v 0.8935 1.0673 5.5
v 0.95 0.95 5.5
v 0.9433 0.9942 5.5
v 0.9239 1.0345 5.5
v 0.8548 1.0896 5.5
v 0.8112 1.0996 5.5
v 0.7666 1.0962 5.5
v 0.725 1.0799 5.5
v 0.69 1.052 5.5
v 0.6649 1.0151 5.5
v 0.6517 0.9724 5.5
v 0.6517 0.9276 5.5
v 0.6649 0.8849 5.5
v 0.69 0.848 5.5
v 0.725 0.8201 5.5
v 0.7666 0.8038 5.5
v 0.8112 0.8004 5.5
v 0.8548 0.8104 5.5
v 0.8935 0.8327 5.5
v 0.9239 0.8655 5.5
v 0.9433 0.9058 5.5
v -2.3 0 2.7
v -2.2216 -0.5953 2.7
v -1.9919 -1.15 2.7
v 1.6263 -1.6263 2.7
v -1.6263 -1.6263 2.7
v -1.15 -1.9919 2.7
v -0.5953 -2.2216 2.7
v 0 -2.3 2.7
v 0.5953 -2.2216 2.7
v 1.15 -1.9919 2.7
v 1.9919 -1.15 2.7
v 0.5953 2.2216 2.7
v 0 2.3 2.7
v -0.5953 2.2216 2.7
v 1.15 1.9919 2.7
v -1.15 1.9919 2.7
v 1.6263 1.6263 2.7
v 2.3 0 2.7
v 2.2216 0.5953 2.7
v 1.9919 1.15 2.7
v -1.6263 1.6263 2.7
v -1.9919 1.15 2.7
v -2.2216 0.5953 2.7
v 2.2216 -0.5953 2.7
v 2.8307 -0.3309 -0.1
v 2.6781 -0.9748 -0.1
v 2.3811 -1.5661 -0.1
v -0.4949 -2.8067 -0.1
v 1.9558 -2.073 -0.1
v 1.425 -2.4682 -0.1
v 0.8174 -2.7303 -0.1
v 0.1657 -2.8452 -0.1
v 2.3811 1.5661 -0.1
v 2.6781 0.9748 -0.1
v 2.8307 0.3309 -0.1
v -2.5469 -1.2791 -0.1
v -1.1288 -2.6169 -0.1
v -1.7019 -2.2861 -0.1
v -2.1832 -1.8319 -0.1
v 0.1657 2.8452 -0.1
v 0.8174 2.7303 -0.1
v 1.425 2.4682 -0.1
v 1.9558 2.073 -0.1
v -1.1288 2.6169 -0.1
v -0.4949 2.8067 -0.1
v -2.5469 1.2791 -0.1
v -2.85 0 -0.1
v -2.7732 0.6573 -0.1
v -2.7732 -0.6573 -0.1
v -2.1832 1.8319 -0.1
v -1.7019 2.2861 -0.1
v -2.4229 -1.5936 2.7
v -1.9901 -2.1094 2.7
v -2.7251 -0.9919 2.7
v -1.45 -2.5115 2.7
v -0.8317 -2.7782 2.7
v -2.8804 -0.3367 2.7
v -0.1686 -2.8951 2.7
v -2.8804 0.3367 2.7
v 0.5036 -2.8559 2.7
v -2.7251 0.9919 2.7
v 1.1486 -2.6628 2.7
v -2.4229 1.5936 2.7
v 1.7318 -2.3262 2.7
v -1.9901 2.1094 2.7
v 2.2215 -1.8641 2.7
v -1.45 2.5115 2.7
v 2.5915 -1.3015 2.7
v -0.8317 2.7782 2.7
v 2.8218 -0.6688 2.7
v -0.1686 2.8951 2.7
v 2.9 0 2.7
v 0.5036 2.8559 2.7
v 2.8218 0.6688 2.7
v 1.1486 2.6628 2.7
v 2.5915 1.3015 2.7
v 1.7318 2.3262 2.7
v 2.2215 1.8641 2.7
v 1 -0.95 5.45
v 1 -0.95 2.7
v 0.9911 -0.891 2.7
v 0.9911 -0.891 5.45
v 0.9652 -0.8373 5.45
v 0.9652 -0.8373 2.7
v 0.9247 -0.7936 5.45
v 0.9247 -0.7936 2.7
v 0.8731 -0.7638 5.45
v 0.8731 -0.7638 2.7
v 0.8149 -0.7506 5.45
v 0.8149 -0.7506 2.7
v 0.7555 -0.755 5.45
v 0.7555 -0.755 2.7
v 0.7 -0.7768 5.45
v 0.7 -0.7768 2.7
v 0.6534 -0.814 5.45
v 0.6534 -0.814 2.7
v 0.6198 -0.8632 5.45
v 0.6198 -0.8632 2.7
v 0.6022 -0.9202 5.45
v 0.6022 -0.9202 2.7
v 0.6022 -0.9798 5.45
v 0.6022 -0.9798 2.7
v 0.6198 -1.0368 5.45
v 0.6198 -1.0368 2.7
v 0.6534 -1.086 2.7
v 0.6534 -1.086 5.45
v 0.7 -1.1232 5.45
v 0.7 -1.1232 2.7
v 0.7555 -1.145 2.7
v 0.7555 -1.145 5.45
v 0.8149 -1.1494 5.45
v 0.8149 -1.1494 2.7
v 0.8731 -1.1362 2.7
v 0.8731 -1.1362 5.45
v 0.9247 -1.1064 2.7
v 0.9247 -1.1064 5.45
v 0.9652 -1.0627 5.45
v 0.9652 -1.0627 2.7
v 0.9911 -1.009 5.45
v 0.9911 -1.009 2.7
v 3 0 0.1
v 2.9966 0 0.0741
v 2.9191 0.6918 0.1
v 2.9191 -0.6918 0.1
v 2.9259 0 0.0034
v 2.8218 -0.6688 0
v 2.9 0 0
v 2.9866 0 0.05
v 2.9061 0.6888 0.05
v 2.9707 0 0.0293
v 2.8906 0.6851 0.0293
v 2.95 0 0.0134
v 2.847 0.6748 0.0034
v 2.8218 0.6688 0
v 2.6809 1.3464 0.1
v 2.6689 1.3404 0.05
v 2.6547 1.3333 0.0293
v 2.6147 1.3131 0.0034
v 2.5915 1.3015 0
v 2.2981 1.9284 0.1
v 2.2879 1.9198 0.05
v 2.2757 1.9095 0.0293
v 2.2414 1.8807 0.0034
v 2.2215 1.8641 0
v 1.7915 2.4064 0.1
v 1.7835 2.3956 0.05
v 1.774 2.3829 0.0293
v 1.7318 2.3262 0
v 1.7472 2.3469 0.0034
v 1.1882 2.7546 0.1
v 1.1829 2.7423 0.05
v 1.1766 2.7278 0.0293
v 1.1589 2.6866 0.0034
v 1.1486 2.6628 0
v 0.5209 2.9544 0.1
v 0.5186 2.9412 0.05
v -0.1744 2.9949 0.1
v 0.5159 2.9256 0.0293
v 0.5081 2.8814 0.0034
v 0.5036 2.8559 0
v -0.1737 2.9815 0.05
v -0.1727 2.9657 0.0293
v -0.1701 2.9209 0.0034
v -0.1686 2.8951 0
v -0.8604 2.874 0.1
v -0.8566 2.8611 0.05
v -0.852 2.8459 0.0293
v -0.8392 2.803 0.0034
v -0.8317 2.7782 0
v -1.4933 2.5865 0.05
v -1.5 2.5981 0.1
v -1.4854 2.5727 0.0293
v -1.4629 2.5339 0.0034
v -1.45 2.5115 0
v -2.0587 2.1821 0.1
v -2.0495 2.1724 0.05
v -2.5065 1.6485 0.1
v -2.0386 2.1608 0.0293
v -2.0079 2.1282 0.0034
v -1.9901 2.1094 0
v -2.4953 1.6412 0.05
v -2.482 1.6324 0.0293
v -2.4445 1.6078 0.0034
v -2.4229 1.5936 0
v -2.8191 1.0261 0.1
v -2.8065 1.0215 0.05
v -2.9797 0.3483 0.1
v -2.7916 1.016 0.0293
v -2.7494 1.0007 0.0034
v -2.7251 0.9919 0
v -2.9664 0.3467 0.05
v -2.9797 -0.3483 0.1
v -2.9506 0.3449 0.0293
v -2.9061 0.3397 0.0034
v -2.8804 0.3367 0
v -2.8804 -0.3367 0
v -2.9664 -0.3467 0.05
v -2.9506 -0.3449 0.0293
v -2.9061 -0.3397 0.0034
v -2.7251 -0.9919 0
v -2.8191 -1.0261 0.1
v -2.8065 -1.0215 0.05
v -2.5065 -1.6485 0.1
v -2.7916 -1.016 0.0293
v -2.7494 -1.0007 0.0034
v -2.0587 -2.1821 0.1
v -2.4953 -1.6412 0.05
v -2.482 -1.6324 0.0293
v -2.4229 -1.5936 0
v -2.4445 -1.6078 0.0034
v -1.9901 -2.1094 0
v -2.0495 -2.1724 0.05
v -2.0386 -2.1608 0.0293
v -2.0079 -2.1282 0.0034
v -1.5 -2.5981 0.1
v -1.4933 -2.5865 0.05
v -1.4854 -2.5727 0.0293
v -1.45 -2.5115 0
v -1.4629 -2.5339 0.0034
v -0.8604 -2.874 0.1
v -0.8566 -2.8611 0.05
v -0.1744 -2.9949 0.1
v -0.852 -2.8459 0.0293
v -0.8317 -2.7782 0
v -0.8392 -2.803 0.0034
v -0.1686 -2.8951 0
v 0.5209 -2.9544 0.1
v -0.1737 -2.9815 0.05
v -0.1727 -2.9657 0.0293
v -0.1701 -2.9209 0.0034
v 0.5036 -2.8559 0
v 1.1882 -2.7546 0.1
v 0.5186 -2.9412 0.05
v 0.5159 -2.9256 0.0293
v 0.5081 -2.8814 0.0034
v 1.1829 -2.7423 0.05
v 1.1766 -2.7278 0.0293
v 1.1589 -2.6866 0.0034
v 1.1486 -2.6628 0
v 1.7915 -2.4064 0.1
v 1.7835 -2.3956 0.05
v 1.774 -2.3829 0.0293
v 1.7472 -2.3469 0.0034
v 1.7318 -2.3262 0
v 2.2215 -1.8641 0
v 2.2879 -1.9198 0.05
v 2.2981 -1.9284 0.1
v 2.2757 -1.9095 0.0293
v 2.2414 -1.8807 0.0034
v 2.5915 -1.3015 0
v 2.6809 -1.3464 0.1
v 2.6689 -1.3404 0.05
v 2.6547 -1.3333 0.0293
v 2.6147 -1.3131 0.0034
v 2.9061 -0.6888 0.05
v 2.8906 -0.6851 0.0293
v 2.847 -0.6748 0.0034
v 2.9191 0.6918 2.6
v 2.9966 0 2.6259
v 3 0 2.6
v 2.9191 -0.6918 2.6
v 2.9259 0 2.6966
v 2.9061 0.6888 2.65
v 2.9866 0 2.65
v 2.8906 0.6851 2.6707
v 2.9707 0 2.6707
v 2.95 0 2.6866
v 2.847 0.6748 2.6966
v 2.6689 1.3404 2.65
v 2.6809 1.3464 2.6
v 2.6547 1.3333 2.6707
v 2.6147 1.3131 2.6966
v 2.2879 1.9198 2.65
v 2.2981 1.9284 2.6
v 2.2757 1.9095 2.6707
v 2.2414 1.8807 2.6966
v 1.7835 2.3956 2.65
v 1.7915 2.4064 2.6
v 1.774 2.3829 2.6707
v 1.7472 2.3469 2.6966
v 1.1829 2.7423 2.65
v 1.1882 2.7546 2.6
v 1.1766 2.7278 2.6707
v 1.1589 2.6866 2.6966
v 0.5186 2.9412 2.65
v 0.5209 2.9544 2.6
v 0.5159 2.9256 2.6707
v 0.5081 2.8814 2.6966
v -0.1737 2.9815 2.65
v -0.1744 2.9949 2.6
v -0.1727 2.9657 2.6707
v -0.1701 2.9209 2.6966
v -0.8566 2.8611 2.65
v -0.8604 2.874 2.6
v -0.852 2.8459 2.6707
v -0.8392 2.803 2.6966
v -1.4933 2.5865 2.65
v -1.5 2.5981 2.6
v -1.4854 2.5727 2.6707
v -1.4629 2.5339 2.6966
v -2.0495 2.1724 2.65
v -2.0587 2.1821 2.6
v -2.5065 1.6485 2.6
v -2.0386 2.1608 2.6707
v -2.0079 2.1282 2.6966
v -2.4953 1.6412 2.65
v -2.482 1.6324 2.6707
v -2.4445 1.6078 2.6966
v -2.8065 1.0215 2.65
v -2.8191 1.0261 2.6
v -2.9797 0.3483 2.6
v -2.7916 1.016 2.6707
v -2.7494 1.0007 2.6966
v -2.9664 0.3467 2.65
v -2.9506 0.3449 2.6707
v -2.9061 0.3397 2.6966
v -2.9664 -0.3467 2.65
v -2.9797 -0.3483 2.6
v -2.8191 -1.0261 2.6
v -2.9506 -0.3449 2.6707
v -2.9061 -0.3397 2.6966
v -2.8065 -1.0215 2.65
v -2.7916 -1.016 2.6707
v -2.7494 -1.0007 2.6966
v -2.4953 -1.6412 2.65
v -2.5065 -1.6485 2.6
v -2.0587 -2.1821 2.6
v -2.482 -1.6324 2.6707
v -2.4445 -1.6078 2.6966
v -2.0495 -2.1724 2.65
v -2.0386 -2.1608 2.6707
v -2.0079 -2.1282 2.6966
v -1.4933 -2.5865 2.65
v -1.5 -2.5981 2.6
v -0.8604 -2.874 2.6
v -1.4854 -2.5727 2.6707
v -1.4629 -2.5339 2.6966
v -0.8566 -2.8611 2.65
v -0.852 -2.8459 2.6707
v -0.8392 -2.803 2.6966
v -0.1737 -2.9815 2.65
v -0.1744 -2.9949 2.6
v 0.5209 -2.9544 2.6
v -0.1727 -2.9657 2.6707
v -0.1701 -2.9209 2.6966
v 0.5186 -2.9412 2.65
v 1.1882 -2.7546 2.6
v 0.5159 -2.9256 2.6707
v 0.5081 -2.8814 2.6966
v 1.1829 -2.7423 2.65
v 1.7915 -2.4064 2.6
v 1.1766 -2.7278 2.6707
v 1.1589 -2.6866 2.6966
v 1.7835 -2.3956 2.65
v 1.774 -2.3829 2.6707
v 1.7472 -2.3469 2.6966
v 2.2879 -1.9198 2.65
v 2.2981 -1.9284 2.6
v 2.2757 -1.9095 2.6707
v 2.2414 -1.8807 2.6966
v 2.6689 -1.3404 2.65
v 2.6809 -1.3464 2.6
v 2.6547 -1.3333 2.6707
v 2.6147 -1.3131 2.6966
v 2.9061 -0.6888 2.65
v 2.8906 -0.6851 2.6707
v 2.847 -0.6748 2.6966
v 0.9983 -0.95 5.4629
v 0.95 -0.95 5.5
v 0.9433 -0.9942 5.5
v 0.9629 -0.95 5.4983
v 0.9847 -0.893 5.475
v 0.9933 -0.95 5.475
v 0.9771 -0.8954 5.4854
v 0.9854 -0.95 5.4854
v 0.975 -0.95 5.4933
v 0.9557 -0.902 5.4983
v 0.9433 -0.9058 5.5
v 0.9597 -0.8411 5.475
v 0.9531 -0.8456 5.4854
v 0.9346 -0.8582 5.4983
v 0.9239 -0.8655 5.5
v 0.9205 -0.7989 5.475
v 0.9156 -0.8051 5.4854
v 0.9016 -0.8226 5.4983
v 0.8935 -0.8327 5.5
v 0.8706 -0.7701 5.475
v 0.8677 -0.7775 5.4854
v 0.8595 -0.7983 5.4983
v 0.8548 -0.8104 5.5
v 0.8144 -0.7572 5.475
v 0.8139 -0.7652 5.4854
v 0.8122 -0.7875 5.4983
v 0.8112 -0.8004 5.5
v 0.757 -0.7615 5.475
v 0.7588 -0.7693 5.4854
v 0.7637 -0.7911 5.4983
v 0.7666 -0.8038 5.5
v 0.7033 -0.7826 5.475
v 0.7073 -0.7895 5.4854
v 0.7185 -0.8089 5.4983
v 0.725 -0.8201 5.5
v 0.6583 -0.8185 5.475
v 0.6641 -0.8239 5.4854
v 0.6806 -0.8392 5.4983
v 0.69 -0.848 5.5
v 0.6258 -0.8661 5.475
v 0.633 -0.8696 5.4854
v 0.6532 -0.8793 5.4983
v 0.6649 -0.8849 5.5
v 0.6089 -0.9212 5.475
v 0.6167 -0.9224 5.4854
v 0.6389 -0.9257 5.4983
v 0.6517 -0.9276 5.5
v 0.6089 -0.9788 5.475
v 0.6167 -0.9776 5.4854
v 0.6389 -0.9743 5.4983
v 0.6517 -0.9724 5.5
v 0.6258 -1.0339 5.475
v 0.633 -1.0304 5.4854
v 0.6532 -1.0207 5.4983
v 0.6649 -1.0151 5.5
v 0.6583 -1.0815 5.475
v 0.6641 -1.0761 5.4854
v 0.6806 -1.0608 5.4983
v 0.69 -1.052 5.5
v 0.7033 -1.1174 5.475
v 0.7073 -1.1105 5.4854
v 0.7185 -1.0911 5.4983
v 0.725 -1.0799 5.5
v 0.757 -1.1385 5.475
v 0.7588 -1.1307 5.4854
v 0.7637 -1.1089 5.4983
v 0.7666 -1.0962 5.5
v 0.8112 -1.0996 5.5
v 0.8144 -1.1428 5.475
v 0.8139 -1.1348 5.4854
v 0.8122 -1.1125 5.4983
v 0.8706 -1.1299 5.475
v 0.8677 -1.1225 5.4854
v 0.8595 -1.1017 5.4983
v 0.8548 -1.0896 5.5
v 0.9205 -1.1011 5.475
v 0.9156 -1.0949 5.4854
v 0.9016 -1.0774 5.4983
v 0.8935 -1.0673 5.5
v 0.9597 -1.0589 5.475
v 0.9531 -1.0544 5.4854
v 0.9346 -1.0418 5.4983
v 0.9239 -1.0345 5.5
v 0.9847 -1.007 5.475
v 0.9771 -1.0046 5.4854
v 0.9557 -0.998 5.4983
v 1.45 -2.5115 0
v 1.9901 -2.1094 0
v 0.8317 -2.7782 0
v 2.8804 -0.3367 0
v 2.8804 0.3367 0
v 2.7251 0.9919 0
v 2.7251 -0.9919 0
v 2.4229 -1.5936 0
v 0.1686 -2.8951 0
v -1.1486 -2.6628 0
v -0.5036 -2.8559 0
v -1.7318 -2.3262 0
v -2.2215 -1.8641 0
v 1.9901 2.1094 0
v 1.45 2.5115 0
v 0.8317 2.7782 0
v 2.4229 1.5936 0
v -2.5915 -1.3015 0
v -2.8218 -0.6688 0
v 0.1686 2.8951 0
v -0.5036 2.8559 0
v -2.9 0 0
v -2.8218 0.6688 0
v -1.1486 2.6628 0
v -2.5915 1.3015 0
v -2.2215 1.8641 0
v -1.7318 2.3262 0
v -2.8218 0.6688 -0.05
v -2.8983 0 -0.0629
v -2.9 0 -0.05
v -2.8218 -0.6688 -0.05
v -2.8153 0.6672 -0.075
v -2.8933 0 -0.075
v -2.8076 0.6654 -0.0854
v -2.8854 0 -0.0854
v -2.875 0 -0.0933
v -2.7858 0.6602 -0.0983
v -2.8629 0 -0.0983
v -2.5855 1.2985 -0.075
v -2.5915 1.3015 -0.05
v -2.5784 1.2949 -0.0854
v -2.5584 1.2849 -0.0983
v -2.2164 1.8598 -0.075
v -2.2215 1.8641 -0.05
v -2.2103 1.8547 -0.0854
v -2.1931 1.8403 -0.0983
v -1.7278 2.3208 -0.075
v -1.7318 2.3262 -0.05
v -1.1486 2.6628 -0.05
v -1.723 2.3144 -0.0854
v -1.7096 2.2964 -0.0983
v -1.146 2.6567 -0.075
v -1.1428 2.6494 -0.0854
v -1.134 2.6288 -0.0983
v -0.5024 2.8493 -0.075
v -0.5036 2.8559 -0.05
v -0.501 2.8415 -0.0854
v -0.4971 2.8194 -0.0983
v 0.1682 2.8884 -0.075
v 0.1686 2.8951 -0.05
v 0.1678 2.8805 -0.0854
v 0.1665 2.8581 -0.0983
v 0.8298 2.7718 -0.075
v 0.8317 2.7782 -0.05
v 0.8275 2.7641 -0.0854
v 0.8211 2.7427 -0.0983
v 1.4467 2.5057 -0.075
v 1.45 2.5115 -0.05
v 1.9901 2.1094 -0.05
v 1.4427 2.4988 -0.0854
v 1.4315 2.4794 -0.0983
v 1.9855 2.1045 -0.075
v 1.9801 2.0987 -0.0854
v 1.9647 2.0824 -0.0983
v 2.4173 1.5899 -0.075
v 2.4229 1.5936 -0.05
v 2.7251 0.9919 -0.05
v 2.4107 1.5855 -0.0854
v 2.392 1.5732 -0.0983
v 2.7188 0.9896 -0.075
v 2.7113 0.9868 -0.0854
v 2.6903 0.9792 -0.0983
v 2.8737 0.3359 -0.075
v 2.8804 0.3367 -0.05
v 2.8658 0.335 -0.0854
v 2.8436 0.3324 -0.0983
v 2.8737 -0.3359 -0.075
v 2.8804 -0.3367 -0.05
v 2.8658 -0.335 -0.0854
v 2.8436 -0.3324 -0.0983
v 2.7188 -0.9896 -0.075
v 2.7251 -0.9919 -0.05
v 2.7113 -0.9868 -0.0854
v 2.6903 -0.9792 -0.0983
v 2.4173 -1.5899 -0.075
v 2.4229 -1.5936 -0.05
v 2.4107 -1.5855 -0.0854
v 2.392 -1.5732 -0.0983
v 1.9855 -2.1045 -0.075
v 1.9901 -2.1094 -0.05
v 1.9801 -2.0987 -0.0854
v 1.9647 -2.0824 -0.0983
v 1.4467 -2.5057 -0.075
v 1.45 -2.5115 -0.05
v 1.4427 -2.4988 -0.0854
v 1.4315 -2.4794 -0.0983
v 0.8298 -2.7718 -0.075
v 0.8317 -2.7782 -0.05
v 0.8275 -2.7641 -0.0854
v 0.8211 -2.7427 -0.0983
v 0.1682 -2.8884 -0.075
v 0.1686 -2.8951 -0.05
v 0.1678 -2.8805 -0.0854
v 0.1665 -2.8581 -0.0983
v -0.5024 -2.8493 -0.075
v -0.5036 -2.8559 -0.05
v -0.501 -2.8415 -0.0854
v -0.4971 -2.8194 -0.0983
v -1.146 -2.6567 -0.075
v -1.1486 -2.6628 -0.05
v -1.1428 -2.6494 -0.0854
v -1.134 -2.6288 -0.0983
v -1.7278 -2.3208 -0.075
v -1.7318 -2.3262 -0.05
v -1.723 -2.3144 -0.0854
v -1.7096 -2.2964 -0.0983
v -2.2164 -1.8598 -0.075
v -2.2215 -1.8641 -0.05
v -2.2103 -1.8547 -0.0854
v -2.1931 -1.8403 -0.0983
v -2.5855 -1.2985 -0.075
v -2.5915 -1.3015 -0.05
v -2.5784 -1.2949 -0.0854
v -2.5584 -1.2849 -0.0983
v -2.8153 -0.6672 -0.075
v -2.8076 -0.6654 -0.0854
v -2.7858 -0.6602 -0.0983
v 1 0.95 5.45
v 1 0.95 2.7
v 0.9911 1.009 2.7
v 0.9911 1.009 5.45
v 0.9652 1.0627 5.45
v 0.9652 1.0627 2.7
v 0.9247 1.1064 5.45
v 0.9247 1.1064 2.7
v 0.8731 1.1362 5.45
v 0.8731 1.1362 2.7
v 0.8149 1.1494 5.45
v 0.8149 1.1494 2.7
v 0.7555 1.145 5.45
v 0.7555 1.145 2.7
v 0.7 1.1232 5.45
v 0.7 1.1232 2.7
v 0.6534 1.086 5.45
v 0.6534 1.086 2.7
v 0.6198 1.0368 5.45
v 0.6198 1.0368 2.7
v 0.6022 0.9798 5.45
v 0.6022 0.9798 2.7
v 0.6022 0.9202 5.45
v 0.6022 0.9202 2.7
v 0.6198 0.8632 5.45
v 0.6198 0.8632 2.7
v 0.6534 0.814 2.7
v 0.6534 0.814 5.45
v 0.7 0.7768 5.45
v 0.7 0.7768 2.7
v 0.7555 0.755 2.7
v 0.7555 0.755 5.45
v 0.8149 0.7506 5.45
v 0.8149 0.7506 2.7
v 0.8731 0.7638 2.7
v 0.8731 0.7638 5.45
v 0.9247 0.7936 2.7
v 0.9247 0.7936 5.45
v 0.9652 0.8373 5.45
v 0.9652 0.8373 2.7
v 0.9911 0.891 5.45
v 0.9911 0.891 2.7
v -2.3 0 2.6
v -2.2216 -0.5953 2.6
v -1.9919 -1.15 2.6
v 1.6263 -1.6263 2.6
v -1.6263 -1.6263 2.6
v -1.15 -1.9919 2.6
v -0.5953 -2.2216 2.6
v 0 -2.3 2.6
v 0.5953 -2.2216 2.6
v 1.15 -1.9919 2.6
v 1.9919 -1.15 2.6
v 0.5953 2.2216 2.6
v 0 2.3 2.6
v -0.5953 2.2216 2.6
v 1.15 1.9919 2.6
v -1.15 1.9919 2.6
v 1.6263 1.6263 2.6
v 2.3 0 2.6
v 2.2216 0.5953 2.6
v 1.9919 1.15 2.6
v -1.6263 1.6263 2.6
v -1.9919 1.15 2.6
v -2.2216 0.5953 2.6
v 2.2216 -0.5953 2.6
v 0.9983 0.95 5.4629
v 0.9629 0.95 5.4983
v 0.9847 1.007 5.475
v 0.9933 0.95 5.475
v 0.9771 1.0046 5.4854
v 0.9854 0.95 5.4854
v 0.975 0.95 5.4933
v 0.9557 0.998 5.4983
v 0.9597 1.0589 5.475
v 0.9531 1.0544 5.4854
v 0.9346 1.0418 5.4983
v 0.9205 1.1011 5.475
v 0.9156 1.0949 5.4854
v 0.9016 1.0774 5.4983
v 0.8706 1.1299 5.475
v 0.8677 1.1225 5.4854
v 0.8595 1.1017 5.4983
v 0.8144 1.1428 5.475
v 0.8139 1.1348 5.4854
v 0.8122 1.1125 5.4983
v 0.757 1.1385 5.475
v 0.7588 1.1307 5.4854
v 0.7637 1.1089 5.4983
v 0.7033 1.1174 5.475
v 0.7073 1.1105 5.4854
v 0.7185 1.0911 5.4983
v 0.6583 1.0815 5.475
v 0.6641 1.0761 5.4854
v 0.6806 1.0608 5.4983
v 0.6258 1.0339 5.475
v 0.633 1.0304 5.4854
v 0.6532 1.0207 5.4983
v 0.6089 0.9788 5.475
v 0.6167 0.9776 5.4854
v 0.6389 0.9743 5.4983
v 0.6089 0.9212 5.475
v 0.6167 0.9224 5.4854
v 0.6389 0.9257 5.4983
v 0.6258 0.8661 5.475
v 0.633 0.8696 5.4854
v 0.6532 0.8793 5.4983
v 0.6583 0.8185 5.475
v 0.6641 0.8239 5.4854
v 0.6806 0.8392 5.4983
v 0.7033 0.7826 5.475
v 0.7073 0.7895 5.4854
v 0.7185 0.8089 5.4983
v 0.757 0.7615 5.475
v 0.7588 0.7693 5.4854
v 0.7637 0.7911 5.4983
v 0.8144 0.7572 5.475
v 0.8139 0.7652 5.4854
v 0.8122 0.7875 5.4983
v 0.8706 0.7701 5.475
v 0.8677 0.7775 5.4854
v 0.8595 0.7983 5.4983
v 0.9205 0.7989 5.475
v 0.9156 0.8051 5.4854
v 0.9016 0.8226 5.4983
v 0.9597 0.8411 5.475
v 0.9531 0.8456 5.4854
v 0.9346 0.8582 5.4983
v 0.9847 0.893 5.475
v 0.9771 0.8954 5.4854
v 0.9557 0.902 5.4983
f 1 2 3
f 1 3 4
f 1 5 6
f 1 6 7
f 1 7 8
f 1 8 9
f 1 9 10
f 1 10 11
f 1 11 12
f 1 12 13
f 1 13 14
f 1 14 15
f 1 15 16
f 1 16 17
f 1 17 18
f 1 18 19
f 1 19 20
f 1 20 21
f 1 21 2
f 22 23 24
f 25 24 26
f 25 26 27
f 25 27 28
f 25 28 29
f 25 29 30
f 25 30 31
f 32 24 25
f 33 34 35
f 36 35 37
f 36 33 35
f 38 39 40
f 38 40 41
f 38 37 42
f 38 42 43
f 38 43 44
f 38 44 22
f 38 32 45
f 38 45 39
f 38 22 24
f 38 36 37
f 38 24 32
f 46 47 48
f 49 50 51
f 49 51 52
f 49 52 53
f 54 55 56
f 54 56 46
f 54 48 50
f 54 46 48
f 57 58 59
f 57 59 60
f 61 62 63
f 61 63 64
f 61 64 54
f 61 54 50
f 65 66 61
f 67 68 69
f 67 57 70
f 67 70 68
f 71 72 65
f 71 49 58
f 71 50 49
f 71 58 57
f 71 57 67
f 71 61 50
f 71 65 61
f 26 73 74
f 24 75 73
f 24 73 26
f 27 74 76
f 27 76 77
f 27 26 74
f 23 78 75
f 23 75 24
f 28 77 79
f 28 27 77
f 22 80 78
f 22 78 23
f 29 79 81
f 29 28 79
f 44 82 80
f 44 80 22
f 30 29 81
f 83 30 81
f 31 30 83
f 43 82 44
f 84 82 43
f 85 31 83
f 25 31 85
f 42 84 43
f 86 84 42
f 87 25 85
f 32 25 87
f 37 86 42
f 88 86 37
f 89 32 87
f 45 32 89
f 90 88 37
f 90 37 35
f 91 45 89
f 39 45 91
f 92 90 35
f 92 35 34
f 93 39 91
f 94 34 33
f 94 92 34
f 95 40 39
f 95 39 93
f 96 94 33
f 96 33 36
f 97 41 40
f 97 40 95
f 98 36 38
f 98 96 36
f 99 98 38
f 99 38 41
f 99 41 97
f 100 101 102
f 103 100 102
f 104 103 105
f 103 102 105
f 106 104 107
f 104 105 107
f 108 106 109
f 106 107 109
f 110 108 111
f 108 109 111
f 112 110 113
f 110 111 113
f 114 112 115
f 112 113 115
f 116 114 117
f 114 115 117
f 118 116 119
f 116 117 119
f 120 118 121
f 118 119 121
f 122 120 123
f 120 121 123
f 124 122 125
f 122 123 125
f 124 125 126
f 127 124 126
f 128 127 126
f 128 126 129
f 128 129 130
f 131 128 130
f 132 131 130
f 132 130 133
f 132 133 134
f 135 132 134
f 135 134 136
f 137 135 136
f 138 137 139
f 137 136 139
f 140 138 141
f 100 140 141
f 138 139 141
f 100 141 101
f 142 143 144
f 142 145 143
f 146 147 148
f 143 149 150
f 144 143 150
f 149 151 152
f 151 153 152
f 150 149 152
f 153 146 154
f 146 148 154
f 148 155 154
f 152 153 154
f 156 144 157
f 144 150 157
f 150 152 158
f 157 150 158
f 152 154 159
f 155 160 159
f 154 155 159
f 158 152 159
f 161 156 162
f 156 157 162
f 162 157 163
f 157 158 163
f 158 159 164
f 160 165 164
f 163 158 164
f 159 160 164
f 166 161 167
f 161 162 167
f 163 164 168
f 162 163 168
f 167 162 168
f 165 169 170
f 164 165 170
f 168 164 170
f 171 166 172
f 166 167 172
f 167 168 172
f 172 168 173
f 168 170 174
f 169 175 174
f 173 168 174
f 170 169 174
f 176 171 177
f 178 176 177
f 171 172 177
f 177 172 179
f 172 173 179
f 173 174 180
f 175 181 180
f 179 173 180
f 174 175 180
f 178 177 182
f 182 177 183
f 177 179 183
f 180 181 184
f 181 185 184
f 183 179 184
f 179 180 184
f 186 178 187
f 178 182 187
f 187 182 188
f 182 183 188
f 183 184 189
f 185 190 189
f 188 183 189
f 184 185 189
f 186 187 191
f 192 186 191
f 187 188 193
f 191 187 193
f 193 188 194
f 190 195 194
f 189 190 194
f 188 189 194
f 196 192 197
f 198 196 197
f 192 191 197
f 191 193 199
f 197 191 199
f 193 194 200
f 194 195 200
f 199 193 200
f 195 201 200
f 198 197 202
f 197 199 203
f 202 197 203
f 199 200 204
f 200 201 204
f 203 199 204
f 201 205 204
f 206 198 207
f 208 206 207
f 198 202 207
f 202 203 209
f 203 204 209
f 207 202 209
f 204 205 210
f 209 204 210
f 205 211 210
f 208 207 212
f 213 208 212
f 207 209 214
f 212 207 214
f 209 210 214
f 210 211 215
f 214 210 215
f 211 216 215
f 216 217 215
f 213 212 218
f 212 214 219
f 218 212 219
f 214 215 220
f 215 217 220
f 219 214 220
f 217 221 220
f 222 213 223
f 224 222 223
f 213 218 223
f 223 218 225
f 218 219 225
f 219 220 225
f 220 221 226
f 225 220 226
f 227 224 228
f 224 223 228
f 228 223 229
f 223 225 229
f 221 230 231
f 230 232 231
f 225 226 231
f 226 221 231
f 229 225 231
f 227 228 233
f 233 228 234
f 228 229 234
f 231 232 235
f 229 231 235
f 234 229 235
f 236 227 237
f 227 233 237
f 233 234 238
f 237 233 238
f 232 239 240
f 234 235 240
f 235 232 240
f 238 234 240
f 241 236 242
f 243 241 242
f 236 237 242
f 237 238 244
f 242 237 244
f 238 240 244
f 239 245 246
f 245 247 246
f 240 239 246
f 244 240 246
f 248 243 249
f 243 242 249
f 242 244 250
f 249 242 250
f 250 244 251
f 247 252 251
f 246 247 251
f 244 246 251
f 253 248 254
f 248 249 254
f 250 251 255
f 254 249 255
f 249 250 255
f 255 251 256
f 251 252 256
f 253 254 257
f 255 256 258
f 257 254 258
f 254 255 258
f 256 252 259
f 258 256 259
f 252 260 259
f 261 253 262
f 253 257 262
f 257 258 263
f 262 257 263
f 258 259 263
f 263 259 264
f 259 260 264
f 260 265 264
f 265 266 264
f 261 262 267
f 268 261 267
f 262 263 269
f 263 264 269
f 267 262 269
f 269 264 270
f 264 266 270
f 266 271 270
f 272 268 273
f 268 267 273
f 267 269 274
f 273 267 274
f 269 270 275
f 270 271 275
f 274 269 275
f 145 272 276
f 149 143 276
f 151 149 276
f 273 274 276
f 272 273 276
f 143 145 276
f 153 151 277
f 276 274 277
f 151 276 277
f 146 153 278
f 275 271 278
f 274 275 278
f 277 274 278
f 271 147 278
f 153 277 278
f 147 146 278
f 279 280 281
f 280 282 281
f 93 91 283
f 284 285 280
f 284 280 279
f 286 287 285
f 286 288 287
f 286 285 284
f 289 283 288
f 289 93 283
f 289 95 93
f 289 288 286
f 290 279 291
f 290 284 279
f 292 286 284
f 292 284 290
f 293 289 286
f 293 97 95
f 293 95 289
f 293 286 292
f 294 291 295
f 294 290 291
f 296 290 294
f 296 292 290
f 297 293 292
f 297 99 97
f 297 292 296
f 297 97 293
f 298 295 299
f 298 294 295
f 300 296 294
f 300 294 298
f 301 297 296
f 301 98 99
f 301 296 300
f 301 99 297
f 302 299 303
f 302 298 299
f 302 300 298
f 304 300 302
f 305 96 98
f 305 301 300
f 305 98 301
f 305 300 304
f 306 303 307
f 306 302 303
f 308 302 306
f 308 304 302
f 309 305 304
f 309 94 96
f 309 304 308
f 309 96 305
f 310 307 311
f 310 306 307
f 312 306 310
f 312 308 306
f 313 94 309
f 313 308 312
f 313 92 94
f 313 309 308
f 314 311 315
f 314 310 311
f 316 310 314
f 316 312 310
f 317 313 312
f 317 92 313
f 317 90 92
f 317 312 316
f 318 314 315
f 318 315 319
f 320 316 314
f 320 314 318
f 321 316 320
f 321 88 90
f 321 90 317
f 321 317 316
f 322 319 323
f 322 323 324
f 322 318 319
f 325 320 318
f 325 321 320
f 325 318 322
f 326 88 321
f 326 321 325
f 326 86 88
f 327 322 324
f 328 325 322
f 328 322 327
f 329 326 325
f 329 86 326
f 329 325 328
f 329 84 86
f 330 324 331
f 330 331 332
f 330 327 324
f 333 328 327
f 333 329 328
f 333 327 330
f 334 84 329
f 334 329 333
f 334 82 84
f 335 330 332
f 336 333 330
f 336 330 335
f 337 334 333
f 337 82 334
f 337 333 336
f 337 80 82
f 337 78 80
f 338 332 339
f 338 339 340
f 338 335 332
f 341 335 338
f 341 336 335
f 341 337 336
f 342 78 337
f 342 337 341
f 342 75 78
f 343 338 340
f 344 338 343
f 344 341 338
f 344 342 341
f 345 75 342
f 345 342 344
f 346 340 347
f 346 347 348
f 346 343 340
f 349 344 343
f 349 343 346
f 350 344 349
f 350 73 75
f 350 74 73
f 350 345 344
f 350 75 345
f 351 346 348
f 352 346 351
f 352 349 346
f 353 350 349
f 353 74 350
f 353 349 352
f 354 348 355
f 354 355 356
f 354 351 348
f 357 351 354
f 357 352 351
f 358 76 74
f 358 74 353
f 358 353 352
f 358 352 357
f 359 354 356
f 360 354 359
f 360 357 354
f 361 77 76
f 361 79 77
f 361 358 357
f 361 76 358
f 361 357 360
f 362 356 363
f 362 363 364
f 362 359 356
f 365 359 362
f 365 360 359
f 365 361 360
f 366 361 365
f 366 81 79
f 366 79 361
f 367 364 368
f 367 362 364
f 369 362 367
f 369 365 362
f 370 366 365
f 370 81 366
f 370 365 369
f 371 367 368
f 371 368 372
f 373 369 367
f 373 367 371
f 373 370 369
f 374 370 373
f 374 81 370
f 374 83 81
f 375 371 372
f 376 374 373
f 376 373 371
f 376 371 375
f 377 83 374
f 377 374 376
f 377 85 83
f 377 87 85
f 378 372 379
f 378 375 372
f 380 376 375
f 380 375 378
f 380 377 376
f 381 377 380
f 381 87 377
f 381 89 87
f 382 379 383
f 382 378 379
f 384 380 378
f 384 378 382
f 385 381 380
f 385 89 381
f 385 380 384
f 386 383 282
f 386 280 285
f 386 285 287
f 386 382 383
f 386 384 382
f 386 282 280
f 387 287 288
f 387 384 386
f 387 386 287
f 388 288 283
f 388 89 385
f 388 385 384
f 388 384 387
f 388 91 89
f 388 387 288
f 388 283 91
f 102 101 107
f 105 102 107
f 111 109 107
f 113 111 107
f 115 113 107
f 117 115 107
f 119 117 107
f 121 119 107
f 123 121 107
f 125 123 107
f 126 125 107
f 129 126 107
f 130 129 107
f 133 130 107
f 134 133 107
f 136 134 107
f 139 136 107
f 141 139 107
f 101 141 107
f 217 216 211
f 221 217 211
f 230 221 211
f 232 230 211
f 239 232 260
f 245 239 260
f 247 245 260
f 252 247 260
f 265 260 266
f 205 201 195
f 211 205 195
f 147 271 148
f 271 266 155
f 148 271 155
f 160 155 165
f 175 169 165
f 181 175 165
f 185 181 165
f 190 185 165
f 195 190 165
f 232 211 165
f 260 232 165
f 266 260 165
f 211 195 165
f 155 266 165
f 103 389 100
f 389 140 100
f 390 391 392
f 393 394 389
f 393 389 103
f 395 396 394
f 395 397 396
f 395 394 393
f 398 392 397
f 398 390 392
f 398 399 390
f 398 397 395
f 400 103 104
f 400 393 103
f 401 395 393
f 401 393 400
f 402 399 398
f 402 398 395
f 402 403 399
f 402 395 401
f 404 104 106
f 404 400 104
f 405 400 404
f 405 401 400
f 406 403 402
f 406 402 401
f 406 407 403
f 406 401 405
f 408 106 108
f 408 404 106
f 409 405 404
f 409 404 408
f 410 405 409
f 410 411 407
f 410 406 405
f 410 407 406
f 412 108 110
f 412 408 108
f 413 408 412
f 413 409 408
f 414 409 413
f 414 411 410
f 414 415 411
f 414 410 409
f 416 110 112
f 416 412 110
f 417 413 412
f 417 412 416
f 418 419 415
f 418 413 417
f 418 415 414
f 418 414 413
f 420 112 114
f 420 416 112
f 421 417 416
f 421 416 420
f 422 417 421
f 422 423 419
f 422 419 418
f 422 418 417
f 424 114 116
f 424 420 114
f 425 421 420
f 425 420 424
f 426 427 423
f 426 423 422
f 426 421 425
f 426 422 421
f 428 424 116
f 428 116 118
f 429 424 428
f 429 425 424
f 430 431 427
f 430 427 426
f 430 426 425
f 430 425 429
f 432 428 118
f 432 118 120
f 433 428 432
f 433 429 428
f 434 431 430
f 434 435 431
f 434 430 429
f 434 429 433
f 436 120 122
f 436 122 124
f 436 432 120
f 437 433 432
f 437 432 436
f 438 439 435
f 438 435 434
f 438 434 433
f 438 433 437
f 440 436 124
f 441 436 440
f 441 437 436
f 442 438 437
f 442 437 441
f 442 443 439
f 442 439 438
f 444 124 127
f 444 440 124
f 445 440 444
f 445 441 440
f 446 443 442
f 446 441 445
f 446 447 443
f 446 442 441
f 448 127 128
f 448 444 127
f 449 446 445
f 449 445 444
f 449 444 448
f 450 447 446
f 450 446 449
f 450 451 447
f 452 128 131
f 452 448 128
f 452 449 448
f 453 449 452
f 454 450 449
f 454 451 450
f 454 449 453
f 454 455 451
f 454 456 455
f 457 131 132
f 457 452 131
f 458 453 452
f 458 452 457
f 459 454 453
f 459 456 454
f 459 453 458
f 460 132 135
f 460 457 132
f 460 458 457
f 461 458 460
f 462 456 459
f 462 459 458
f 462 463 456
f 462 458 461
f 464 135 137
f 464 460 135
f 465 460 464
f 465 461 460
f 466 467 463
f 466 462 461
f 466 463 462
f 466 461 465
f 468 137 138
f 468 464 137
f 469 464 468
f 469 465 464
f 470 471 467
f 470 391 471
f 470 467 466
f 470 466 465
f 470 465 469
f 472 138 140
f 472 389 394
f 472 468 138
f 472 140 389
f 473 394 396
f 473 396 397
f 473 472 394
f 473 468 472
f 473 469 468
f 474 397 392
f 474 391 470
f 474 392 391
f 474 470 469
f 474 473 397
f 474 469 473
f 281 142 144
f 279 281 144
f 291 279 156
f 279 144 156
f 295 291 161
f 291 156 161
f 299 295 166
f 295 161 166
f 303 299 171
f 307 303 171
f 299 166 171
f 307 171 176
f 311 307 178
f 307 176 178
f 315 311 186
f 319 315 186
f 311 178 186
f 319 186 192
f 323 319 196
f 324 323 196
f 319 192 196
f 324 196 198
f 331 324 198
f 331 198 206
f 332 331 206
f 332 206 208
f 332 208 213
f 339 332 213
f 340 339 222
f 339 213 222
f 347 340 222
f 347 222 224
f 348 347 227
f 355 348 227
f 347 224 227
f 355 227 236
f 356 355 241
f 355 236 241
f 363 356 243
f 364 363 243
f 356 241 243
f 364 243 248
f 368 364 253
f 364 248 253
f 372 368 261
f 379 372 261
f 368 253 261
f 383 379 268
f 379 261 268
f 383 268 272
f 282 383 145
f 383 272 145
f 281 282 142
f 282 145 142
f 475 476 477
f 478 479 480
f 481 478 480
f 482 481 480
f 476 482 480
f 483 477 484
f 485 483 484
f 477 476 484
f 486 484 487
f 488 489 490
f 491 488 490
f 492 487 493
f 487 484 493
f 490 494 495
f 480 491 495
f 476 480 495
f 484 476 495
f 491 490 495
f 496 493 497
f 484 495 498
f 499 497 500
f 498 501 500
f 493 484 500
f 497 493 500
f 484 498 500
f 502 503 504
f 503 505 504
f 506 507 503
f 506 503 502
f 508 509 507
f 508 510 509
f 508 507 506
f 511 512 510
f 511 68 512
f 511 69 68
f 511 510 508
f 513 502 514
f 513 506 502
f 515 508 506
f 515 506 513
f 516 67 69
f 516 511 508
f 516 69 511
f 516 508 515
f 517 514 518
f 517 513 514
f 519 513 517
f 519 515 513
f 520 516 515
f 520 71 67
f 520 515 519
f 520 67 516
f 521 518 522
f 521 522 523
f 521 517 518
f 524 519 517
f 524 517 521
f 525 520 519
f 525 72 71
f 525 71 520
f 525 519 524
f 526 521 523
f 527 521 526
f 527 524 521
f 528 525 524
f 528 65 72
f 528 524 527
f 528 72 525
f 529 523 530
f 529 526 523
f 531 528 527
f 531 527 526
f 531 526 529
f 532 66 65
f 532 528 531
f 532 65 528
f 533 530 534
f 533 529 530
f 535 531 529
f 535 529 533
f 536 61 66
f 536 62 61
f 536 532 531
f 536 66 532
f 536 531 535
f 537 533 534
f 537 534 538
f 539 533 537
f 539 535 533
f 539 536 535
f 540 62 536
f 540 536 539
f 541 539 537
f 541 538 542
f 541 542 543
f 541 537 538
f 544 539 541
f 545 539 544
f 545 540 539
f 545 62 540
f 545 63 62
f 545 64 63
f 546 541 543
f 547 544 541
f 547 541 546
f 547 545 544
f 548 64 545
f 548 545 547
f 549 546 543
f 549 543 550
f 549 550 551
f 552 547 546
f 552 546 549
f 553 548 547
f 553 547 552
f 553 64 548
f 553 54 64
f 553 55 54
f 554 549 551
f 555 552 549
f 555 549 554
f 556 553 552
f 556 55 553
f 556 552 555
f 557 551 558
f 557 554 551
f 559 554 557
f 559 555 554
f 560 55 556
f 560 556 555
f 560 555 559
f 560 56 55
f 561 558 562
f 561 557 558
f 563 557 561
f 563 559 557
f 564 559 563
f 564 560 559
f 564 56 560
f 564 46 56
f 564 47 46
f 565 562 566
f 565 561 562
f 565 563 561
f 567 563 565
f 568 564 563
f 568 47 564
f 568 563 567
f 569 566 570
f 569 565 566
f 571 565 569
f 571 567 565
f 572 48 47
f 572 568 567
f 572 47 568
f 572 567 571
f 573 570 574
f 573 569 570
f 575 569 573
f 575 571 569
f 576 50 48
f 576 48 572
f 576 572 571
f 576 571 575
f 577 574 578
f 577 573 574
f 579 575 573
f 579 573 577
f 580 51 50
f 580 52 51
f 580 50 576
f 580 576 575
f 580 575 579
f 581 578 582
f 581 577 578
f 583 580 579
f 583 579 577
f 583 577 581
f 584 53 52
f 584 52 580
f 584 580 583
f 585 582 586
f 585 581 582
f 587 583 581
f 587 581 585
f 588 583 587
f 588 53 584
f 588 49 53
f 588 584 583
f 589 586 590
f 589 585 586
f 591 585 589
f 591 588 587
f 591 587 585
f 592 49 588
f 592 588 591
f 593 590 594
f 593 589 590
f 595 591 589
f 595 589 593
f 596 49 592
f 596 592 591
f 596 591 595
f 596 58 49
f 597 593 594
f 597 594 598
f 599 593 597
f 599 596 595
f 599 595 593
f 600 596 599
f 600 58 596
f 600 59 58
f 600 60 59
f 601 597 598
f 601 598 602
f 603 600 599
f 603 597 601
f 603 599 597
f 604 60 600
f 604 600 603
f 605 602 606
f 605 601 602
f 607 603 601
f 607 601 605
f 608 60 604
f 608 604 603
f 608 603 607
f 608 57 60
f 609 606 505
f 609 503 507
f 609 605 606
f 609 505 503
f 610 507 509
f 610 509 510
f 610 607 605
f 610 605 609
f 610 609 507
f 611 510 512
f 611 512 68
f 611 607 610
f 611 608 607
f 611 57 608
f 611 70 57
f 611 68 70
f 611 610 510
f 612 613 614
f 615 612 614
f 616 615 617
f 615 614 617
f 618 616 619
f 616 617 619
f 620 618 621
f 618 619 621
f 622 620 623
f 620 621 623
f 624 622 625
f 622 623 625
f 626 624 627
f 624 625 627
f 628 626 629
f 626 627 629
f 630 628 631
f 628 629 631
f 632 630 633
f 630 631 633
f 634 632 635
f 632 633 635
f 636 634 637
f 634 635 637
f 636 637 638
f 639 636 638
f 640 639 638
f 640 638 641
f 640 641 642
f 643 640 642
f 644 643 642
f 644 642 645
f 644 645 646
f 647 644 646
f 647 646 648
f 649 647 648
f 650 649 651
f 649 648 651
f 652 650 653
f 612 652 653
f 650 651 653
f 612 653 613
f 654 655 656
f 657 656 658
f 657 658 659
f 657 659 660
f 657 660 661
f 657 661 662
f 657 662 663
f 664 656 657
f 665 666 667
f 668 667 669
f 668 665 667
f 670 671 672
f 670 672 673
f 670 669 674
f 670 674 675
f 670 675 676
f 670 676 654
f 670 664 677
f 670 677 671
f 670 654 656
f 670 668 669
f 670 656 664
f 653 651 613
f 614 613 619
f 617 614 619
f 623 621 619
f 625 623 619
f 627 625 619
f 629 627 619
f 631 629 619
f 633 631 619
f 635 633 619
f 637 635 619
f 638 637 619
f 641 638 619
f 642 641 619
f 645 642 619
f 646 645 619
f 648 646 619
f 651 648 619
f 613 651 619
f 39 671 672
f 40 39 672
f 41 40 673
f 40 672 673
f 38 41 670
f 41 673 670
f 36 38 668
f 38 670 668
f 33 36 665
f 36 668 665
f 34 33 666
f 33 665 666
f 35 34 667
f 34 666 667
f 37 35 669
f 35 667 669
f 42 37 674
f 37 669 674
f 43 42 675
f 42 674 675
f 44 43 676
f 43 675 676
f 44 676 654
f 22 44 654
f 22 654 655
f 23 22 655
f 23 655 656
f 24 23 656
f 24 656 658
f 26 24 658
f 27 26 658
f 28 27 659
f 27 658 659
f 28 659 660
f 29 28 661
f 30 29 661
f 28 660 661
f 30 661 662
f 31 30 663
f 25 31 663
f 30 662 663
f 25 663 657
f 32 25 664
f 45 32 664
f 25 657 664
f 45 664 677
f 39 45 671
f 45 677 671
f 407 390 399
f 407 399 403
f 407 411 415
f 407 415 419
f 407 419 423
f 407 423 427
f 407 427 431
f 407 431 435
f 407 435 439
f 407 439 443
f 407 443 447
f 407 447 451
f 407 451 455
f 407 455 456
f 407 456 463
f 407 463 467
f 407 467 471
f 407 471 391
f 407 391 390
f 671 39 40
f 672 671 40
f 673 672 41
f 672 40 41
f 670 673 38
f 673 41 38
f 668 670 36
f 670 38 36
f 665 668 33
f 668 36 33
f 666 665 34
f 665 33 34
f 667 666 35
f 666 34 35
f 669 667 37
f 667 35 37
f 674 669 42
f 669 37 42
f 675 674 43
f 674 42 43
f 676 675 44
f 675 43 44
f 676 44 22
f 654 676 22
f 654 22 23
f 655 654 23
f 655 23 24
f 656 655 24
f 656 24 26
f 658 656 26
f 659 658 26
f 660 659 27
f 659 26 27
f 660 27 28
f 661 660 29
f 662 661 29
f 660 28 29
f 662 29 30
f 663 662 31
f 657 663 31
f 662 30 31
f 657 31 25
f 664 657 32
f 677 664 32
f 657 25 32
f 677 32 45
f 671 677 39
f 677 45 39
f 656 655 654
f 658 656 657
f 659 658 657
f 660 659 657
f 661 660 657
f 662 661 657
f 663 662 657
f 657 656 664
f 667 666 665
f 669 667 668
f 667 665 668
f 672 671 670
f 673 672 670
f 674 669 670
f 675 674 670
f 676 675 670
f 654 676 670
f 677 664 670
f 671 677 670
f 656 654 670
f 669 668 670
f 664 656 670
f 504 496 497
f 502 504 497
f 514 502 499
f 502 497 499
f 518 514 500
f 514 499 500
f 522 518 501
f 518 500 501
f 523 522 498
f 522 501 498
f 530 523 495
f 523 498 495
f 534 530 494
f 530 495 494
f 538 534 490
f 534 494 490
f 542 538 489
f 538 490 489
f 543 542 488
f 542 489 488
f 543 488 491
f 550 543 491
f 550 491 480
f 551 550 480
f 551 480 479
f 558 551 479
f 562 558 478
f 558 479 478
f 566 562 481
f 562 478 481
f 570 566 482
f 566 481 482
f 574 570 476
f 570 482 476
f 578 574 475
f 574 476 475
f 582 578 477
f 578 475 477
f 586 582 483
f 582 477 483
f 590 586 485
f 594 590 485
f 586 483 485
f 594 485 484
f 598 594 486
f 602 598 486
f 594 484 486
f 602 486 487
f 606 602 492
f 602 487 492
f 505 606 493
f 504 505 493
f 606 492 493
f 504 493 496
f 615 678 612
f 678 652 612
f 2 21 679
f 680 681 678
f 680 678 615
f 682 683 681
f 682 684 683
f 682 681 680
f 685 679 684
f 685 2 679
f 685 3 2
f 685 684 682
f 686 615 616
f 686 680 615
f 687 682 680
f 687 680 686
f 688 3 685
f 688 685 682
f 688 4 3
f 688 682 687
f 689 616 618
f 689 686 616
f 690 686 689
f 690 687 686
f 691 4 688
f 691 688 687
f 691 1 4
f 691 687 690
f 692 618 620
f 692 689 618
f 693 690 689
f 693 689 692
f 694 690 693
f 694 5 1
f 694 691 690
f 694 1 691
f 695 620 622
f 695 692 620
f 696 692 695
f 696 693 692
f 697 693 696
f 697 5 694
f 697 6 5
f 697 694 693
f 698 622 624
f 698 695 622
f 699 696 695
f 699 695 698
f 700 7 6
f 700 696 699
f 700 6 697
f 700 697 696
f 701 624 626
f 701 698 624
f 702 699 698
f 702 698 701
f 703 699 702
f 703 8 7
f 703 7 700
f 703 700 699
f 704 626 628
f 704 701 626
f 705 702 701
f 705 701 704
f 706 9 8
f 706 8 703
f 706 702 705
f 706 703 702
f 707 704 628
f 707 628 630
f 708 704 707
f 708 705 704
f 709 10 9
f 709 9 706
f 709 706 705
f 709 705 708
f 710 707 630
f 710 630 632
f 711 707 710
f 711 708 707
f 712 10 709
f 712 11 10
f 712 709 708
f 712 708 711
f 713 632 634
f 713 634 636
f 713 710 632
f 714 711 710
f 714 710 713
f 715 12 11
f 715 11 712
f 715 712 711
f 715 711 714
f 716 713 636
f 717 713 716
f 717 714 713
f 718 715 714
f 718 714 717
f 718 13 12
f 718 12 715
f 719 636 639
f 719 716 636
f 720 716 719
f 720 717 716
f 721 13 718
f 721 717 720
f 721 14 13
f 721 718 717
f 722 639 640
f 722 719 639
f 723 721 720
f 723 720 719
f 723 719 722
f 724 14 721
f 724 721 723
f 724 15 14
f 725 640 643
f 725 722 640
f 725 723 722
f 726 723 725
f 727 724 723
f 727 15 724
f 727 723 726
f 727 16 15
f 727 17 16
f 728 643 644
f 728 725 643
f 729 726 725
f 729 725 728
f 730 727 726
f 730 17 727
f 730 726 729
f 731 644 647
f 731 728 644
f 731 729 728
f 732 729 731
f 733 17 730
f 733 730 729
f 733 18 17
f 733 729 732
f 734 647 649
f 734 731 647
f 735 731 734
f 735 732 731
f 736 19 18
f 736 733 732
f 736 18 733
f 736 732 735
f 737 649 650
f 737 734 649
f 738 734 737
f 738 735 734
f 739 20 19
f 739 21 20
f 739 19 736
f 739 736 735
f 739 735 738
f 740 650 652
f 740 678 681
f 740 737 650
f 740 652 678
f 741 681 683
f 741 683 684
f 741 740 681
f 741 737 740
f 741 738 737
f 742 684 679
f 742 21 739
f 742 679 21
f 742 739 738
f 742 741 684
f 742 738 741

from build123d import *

# Parameters (mm, degrees)
SKETCH1_R             = 3
BOSS_EXTRUDE1_DEPTH   = 2.7
SKETCH3_R             = 0.2
BOSS_EXTRUDE2_DEPTH   = 2.8
BOSS_EXTRUDE2_2_DEPTH = 2.8
FILLET1_R             = 0.1
SKETCH4_R             = 2.9
BOSS_EXTRUDE3_DEPTH   = 0.1
FILLET2_R             = 0.05
SKETCH6_R             = 2.3
CUT_EXTRUDE1_DEPTH    = 0.1
SKETCH7_R             = 2.3
BOSS_EXTRUDE6_DEPTH   = 0.1
FILLET3_R             = 0.05
FILLET4_R             = 0.05


with BuildPart() as part:
    # Sketch1 → Boss-Extrude1 (new body)
    with BuildSketch(Plane.XY):
        Circle(SKETCH1_R)
    extrude(amount=BOSS_EXTRUDE1_DEPTH)

    # Fillet1
    fillet1_edges = [part.edges().sort_by_distance(p)[0] for p in [
        (-3, 0, 0),
        (-3, 0, 2.7),
    ]]
    fillet(fillet1_edges, radius=FILLET1_R)

    # Sketch6 → Cut-Extrude1 (cut)
    with BuildSketch(Plane.XY.offset(2.7)):
        Circle(SKETCH6_R)
    extrude(amount=-CUT_EXTRUDE1_DEPTH, mode=Mode.SUBTRACT)


with BuildPart() as body_2:
    # Sketch3 → Boss-Extrude2 (new body)
    with BuildSketch(Plane.XY.offset(2.7)):
        with Locations((0.8, -0.95)):
            Circle(SKETCH3_R)
    extrude(amount=BOSS_EXTRUDE2_DEPTH)

    # Fillet3
    fillet3_edges = [body_2.edges().sort_by_distance(p)[0] for p in [
        (0.6, -0.95, 5.5),
    ]]
    fillet(fillet3_edges, radius=FILLET3_R)


with BuildPart() as body_3:
    # Sketch3 → Boss-Extrude2 2 (new body)
    with BuildSketch(Plane.XY.offset(2.7)):
        with Locations((0.8, 0.95)):
            Circle(SKETCH3_R)
    extrude(amount=BOSS_EXTRUDE2_2_DEPTH)

    # Fillet4
    fillet4_edges = [body_3.edges().sort_by_distance(p)[0] for p in [
        (0.6, 0.95, 5.5),
    ]]
    fillet(fillet4_edges, radius=FILLET4_R)


with BuildPart() as body_4:
    # Sketch4 → Boss-Extrude3 (new body)
    with BuildSketch(Plane(origin=(0, 0, 0), x_dir=(-1, 0, 0), z_dir=(0, 0, -1))):
        Circle(SKETCH4_R)
    extrude(amount=BOSS_EXTRUDE3_DEPTH)

    # Fillet2
    fillet2_edges = [body_4.edges().sort_by_distance(p)[0] for p in [
        (2.9, 0, -0.1),
    ]]
    fillet(fillet2_edges, radius=FILLET2_R)


with BuildPart() as body_5:
    # Sketch7 → Boss-Extrude6 (new body)
    with BuildSketch(Plane.XY.offset(2.6)):
        Circle(SKETCH7_R)
    extrude(amount=BOSS_EXTRUDE6_DEPTH)


solid = Compound([part.part, body_2.part, body_3.part, body_4.part, body_5.part])
